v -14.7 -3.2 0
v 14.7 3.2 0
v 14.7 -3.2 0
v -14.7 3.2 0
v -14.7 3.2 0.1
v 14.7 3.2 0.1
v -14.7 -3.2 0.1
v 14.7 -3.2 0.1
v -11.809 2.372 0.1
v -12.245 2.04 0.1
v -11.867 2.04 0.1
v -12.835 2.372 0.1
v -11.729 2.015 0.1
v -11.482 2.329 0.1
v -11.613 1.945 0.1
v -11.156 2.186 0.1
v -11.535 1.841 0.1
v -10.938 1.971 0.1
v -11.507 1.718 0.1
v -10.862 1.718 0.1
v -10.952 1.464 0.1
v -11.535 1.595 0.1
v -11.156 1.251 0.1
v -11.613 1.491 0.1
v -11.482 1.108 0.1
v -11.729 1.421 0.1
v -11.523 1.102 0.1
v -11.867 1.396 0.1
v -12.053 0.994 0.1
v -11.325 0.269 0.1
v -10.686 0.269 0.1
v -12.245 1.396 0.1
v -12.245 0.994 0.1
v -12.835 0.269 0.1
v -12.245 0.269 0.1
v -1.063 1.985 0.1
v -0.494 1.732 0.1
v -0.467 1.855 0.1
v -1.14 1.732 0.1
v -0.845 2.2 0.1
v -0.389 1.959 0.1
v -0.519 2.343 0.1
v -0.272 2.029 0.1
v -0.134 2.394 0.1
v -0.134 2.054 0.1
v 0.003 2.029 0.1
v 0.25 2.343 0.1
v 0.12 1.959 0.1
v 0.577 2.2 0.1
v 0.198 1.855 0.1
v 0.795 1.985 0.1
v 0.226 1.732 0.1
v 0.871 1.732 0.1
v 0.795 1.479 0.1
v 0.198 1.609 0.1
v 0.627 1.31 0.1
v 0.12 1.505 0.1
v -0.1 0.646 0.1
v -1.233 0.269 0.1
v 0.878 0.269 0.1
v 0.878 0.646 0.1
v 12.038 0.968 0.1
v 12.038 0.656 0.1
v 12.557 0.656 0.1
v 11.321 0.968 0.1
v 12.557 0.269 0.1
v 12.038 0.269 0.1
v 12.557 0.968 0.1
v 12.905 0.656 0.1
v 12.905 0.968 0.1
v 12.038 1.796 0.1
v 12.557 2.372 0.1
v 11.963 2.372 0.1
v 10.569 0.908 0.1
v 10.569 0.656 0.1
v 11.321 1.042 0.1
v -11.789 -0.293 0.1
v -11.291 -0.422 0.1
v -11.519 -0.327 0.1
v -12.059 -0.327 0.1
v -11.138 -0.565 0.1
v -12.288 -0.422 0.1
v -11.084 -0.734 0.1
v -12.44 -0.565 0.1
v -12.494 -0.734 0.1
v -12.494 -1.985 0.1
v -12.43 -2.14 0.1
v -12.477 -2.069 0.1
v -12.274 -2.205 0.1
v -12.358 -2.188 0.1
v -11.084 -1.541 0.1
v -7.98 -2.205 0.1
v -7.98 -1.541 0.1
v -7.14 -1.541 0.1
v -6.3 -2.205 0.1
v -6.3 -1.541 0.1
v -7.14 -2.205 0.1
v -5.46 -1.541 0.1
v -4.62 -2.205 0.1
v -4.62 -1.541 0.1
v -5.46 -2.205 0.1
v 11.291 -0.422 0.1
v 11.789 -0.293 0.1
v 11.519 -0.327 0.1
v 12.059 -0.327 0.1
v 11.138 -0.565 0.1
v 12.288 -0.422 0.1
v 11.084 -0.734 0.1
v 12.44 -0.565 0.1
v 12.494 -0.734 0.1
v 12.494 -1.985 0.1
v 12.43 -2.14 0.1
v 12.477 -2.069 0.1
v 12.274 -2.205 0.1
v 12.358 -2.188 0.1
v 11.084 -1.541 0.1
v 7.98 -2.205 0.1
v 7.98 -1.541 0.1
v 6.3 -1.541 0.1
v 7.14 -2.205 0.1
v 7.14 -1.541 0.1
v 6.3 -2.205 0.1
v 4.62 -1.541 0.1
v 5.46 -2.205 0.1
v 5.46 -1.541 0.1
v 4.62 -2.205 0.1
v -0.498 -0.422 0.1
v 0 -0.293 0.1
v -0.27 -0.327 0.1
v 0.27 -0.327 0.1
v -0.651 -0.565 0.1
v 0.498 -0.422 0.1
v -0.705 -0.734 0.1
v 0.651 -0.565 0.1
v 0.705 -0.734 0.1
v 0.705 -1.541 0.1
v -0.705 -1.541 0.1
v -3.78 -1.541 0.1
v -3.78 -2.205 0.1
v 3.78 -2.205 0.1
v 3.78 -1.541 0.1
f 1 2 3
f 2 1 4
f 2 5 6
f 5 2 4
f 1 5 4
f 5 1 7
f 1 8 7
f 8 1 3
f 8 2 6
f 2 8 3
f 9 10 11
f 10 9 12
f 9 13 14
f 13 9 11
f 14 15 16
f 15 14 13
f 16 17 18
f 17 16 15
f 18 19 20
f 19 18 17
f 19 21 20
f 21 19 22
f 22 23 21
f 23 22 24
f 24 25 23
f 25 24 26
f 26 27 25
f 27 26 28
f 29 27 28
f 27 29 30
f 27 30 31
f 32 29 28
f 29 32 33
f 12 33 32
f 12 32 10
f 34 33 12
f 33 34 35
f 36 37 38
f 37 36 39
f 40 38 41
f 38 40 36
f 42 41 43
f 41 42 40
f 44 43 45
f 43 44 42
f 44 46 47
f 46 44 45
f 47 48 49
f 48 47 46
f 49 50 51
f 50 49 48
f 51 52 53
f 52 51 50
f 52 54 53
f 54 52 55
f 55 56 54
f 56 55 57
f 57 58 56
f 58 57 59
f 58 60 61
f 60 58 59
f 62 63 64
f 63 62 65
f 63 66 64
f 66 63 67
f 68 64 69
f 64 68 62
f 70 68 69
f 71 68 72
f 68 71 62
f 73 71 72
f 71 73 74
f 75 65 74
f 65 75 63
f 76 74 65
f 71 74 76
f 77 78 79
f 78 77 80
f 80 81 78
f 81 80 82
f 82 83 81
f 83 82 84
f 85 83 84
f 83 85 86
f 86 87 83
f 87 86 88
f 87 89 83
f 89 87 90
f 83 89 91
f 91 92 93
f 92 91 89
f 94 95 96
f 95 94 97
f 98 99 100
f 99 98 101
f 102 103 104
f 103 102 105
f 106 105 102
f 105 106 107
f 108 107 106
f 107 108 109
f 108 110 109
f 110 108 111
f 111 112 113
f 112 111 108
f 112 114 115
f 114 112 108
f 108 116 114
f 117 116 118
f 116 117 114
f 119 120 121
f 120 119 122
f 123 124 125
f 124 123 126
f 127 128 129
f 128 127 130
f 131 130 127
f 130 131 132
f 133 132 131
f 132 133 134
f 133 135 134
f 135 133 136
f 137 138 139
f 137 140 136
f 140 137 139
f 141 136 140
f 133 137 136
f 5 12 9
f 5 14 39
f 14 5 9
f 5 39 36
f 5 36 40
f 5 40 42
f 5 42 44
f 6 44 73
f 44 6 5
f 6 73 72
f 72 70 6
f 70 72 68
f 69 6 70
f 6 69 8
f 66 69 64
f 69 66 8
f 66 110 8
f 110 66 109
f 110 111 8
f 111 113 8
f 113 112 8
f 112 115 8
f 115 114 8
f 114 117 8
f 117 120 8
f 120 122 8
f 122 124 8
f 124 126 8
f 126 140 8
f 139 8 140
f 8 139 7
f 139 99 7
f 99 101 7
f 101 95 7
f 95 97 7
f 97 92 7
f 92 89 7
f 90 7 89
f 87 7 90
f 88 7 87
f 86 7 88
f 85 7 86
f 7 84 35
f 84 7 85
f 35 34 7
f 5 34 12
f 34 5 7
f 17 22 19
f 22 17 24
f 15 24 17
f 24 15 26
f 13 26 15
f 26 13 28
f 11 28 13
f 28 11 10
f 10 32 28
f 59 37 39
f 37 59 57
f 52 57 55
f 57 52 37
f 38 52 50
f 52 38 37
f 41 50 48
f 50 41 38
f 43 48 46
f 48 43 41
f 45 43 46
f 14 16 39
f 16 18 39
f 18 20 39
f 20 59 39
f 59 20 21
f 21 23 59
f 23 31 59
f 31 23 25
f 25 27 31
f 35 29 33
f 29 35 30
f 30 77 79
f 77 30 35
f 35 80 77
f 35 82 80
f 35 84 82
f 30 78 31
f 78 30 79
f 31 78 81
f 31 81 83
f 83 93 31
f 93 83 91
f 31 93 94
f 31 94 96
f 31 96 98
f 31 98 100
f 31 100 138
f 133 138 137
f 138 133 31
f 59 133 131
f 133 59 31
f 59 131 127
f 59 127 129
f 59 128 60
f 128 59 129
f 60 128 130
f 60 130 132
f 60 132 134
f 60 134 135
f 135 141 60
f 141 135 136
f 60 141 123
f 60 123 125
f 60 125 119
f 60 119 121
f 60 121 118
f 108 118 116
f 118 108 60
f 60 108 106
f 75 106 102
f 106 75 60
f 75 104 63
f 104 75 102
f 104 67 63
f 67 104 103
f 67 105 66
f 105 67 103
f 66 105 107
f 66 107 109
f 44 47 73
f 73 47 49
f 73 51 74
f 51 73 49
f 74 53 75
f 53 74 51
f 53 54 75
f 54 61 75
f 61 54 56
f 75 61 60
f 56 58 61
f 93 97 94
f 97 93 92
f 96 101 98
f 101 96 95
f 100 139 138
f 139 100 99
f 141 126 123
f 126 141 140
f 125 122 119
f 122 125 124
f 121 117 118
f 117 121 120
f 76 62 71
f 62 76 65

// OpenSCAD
// file: ../p/box5-12.scad
use <../lib.scad>
function ldraw_lib__box5_12() = [
// 0 Box with 5 Faces without Any Edges
// 0 Name: box5-12.dat
// 0 Author: Chris Dee [cwdee]
// 0 !LDRAW_ORG Primitive UPDATE 2009-02
// 0 !LICENSE Licensed under CC BY 4.0 : see CAreadme.txt
// 
// 0 BFC CERTIFY CCW
  [0,"BFC","CERTIFY"],
  [0,"BFC","CCW"],
// 
// 0 !HISTORY 2009-09-03 [PTadmin] Official Update 2009-02
// 
// 
// 4 16 1 1 1 1 1 -1 -1 1 -1 -1 1 1
  [4,16,1,1,1,1,1,-1,-1,1,-1,-1,1,1],
// 4 16 -1 0 1 1 0 1 1 1 1 -1 1 1
  [4,16,-1,0,1,1,0,1,1,1,1,-1,1,1],
// 4 16 -1 0 -1 -1 0 1 -1 1 1 -1 1 -1
  [4,16,-1,0,-1,-1,0,1,-1,1,1,-1,1,-1],
// 4 16 1 0 -1 -1 0 -1 -1 1 -1 1 1 -1
  [4,16,1,0,-1,-1,0,-1,-1,1,-1,1,1,-1],
// 4 16 1 0 1 1 0 -1 1 1 -1 1 1 1
  [4,16,1,0,1,1,0,-1,1,1,-1,1,1,1],
// 0
];
module ldraw_lib__box5_12(step=0, col=false, unit=2/5, alt=false, line=0.2, solid=!$preview)
    makepoly(ldraw_lib__box5_12(), step=step, col=col, unit=unit, alt=alt, line=line, solid=solid);
ldraw_lib__box5_12(line=0.2);
// main file
use <../lib.scad>
use <../p/box5-12.scad>
function ldraw_lib__4125165j() = [
// 0 Sticker  0.8 x  3.7 with "R 2 4" and Black Stripes White Background
// 0 Name: 4125165j.dat
// 0 Author: Max Martin Richter [MMR1988]
// 0 !LDRAW_ORG Part UPDATE 2019-03
// 0 !LICENSE Licensed under CC BY 4.0 : see CAreadme.txt
// 
// 0 BFC CERTIFY CCW
  [0,"BFC","CERTIFY"],
  [0,"BFC","CCW"],
// 
// 0 !KEYWORDS Gearbox, Set 8448, Shift
// 
// 0 !HISTORY 2019-12-27 [PTadmin] Official Update 2019-03
// 
// 
// 1 16 0 -.25 0 36.75 0 0 0 .25 0 0 0 8 box5-12.dat
  [1,16,0,-.25,0,36.75,0,0,0,.25,0,0,0,8, ldraw_lib__box5_12()],
// 
// 4 4 -29.5227 -0.25 5.93 -32.088 -0.25 5.93 -30.613 -0.25 5.099 -29.668 -0.25 5.099
  [4,4,-29.5227,-0.25,5.93,-32.088,-0.25,5.93,-30.613,-0.25,5.099,-29.668,-0.25,5.099],
// 4 4 -28.7059 -0.25 5.8232 -29.5227 -0.25 5.93 -29.668 -0.25 5.099 -29.3236 -0.25 5.0378
  [4,4,-28.7059,-0.25,5.8232,-29.5227,-0.25,5.93,-29.668,-0.25,5.099,-29.3236,-0.25,5.0378],
// 4 4 -27.8903 -0.25 5.4648 -28.7059 -0.25 5.8232 -29.3236 -0.25 5.0378 -29.0316 -0.25 4.8635
  [4,4,-27.8903,-0.25,5.4648,-28.7059,-0.25,5.8232,-29.3236,-0.25,5.0378,-29.0316,-0.25,4.8635],
// 4 4 -27.3454 -0.25 4.9286 -27.8903 -0.25 5.4648 -29.0316 -0.25 4.8635 -28.8365 -0.25 4.6027
  [4,4,-27.3454,-0.25,4.9286,-27.8903,-0.25,5.4648,-29.0316,-0.25,4.8635,-28.8365,-0.25,4.6027],
// 4 4 -27.154 -0.25 4.296 -27.3454 -0.25 4.9286 -28.8365 -0.25 4.6027 -28.768 -0.25 4.295
  [4,4,-27.154,-0.25,4.296,-27.3454,-0.25,4.9286,-28.8365,-0.25,4.6027,-28.768,-0.25,4.295],
// 4 4 -27.381 -0.25 3.661 -27.154 -0.25 4.296 -28.768 -0.25 4.295 -28.8365 -0.25 3.9873
  [4,4,-27.381,-0.25,3.661,-27.154,-0.25,4.296,-28.768,-0.25,4.295,-28.8365,-0.25,3.9873],
// 4 4 -27.8903 -0.25 3.1272 -27.381 -0.25 3.661 -28.8365 -0.25 3.9873 -29.0316 -0.25 3.7265
  [4,4,-27.8903,-0.25,3.1272,-27.381,-0.25,3.661,-28.8365,-0.25,3.9873,-29.0316,-0.25,3.7265],
// 4 4 -28.7059 -0.25 2.7688 -27.8903 -0.25 3.1272 -29.0316 -0.25 3.7265 -29.3236 -0.25 3.5522
  [4,4,-28.7059,-0.25,2.7688,-27.8903,-0.25,3.1272,-29.0316,-0.25,3.7265,-29.3236,-0.25,3.5522],
// 4 4 -28.8073 -0.25 2.7556 -28.7059 -0.25 2.7688 -29.3236 -0.25 3.5522 -29.668 -0.25 3.491
  [4,4,-28.8073,-0.25,2.7556,-28.7059,-0.25,2.7688,-29.3236,-0.25,3.5522,-29.668,-0.25,3.491],
// 4 4 -28.8073 -0.25 2.7556 -29.668 -0.25 3.491 -30.132 -0.25 2.485 -28.3114 -0.25 0.672
  [4,4,-28.8073,-0.25,2.7556,-29.668,-0.25,3.491,-30.132,-0.25,2.485,-28.3114,-0.25,0.672],
// 3 4 -28.8073 -0.25 2.7556 -28.3114 -0.25 0.672 -26.7149 -0.25 0.672
  [3,4,-28.8073,-0.25,2.7556,-28.3114,-0.25,0.672,-26.7149,-0.25,0.672],
// 4 4 -30.132 -0.25 2.485 -29.668 -0.25 3.491 -30.613 -0.25 3.491 -30.613 -0.25 2.485
  [4,4,-30.132,-0.25,2.485,-29.668,-0.25,3.491,-30.613,-0.25,3.491,-30.613,-0.25,2.485],
// 3 4 -32.088 -0.25 5.93 -30.613 -0.25 2.485 -30.613 -0.25 3.491
  [3,4,-32.088,-0.25,5.93,-30.613,-0.25,2.485,-30.613,-0.25,3.491],
// 3 4 -32.088 -0.25 5.93 -30.613 -0.25 3.491 -30.613 -0.25 5.099
  [3,4,-32.088,-0.25,5.93,-30.613,-0.25,3.491,-30.613,-0.25,5.099],
// 4 4 -32.088 -0.25 5.93 -32.088 -0.25 0.672 -30.613 -0.25 0.672 -30.613 -0.25 2.485
  [4,4,-32.088,-0.25,5.93,-32.088,-0.25,0.672,-30.613,-0.25,0.672,-30.613,-0.25,2.485],
// 4 4 -2.85 -0.25 4.331 -1.2358 -0.25 4.331 -1.1675 -0.25 4.6377 -2.6586 -0.25 4.9636
  [4,4,-2.85,-0.25,4.331,-1.2358,-0.25,4.331,-1.1675,-0.25,4.6377,-2.6586,-0.25,4.9636],
// 4 4 -2.1137 -0.25 5.4998 -2.6586 -0.25 4.9636 -1.1675 -0.25 4.6377 -0.9724 -0.25 4.8985
  [4,4,-2.1137,-0.25,5.4998,-2.6586,-0.25,4.9636,-1.1675,-0.25,4.6377,-0.9724,-0.25,4.8985],
// 4 4 -1.2981 -0.25 5.8582 -2.1137 -0.25 5.4998 -0.9724 -0.25 4.8985 -0.6804 -0.25 5.0728
  [4,4,-1.2981,-0.25,5.8582,-2.1137,-0.25,5.4998,-0.9724,-0.25,4.8985,-0.6804,-0.25,5.0728],
// 4 4 -0.336 -0.25 5.984 -1.2981 -0.25 5.8582 -0.6804 -0.25 5.0728 -0.336 -0.25 5.134
  [4,4,-0.336,-0.25,5.984,-1.2981,-0.25,5.8582,-0.6804,-0.25,5.0728,-0.336,-0.25,5.134],
// 4 4 0.6261 -0.25 5.8582 -0.336 -0.25 5.984 -0.336 -0.25 5.134 0.0084 -0.25 5.0728
  [4,4,0.6261,-0.25,5.8582,-0.336,-0.25,5.984,-0.336,-0.25,5.134,0.0084,-0.25,5.0728],
// 4 4 1.4417 -0.25 5.4998 0.6261 -0.25 5.8582 0.0084 -0.25 5.0728 0.3004 -0.25 4.8985
  [4,4,1.4417,-0.25,5.4998,0.6261,-0.25,5.8582,0.0084,-0.25,5.0728,0.3004,-0.25,4.8985],
// 4 4 1.9866 -0.25 4.9636 1.4417 -0.25 5.4998 0.3004 -0.25 4.8985 0.4955 -0.25 4.6377
  [4,4,1.9866,-0.25,4.9636,1.4417,-0.25,5.4998,0.3004,-0.25,4.8985,0.4955,-0.25,4.6377],
// 4 4 2.178 -0.25 4.331 1.9866 -0.25 4.9636 0.4955 -0.25 4.6377 0.5638 -0.25 4.331
  [4,4,2.178,-0.25,4.331,1.9866,-0.25,4.9636,0.4955,-0.25,4.6377,0.5638,-0.25,4.331],
// 4 4 1.9866 -0.25 3.6984 2.178 -0.25 4.331 0.5638 -0.25 4.331 0.4955 -0.25 4.0223
  [4,4,1.9866,-0.25,3.6984,2.178,-0.25,4.331,0.5638,-0.25,4.331,0.4955,-0.25,4.0223],
// 4 4 1.5671 -0.25 3.2746 1.9866 -0.25 3.6984 0.4955 -0.25 4.0223 0.3 -0.25 3.7618
  [4,4,1.5671,-0.25,3.2746,1.9866,-0.25,3.6984,0.4955,-0.25,4.0223,0.3,-0.25,3.7618],
// 4 4 -0.249 -0.25 1.616 1.5671 -0.25 3.2746 0.3 -0.25 3.7618 -3.0834 -0.25 0.672
  [4,4,-0.249,-0.25,1.616,1.5671,-0.25,3.2746,0.3,-0.25,3.7618,-3.0834,-0.25,0.672],
// 4 4 -0.249 -0.25 1.616 -3.0834 -0.25 0.672 2.194 -0.25 0.672 2.194 -0.25 1.616
  [4,4,-0.249,-0.25,1.616,-3.0834,-0.25,0.672,2.194,-0.25,0.672,2.194,-0.25,1.616],
// 4 4 30.096 -0.25 1.641 31.3937 -0.25 1.641 30.096 -0.25 2.419 28.3027 -0.25 2.419
  [4,4,30.096,-0.25,1.641,31.3937,-0.25,1.641,30.096,-0.25,2.419,28.3027,-0.25,2.419],
// 4 4 30.096 -0.25 0.672 31.3937 -0.25 0.672 31.3937 -0.25 1.641 30.096 -0.25 1.641
  [4,4,30.096,-0.25,0.672,31.3937,-0.25,0.672,31.3937,-0.25,1.641,30.096,-0.25,1.641],
// 4 4 30.096 -0.25 2.419 31.3937 -0.25 1.641 32.2627 -0.25 1.641 31.3937 -0.25 2.419
  [4,4,30.096,-0.25,2.419,31.3937,-0.25,1.641,32.2627,-0.25,1.641,31.3937,-0.25,2.419],
// 3 4 32.2627 -0.25 2.419 31.3937 -0.25 2.419 32.2627 -0.25 1.641
  [3,4,32.2627,-0.25,2.419,31.3937,-0.25,2.419,32.2627,-0.25,1.641],
// 4 4 30.096 -0.25 2.419 31.3937 -0.25 2.419 31.3937 -0.25 5.93 30.096 -0.25 4.4889
  [4,4,30.096,-0.25,2.419,31.3937,-0.25,2.419,31.3937,-0.25,5.93,30.096,-0.25,4.4889],
// 4 4 30.096 -0.25 4.4889 31.3937 -0.25 5.93 29.9079 -0.25 5.93 26.4237 -0.25 2.2707
  [4,4,30.096,-0.25,4.4889,31.3937,-0.25,5.93,29.9079,-0.25,5.93,26.4237,-0.25,2.2707],
// 4 4 26.4237 -0.25 1.641 30.096 -0.25 1.641 28.3027 -0.25 2.419 26.4237 -0.25 2.2707
  [4,4,26.4237,-0.25,1.641,30.096,-0.25,1.641,28.3027,-0.25,2.419,26.4237,-0.25,2.2707],
// 3 4 28.3027 -0.25 2.6055 26.4237 -0.25 2.2707 28.3027 -0.25 2.419
  [3,4,28.3027,-0.25,2.6055,26.4237,-0.25,2.2707,28.3027,-0.25,2.419],
// 3 4 30.096 -0.25 4.4889 26.4237 -0.25 2.2707 28.3027 -0.25 2.6055
  [3,4,30.096,-0.25,4.4889,26.4237,-0.25,2.2707,28.3027,-0.25,2.6055],
// 4 0 -28.7987 -0.25 -0.8168 -29.473 -0.25 -0.733 -30.1473 -0.25 -0.8168 -28.2271 -0.25 -1.0555
  [4,0,-28.7987,-0.25,-0.8168,-29.473,-0.25,-0.733,-30.1473,-0.25,-0.8168,-28.2271,-0.25,-1.0555],
// 4 0 -28.2271 -0.25 -1.0555 -30.1473 -0.25 -0.8168 -30.7189 -0.25 -1.0555 -27.8451 -0.25 -1.4127
  [4,0,-28.2271,-0.25,-1.0555,-30.1473,-0.25,-0.8168,-30.7189,-0.25,-1.0555,-27.8451,-0.25,-1.4127],
// 4 0 -27.8451 -0.25 -1.4127 -30.7189 -0.25 -1.0555 -31.1009 -0.25 -1.4127 -27.711 -0.25 -1.834
  [4,0,-27.8451,-0.25,-1.4127,-30.7189,-0.25,-1.0555,-31.1009,-0.25,-1.4127,-27.711,-0.25,-1.834],
// 4 0 -27.711 -0.25 -1.834 -31.1009 -0.25 -1.4127 -31.235 -0.25 -1.834 -31.235 -0.25 -4.963
  [4,0,-27.711,-0.25,-1.834,-31.1009,-0.25,-1.4127,-31.235,-0.25,-1.834,-31.235,-0.25,-4.963],
// 4 0 -27.711 -0.25 -1.834 -31.235 -0.25 -4.963 -31.1932 -0.25 -5.1731 -31.0742 -0.25 -5.3512
  [4,0,-27.711,-0.25,-1.834,-31.235,-0.25,-4.963,-31.1932,-0.25,-5.1731,-31.0742,-0.25,-5.3512],
// 4 0 -27.711 -0.25 -1.834 -31.0742 -0.25 -5.3512 -30.8961 -0.25 -5.4702 -30.686 -0.25 -5.512
  [4,0,-27.711,-0.25,-1.834,-31.0742,-0.25,-5.3512,-30.8961,-0.25,-5.4702,-30.686,-0.25,-5.512],
// 3 0 -27.711 -0.25 -1.834 -30.686 -0.25 -5.512 -27.711 -0.25 -3.853
  [3,0,-27.711,-0.25,-1.834,-30.686,-0.25,-5.512,-27.711,-0.25,-3.853],
// 4 0 -19.95 -0.25 -3.853 -27.711 -0.25 -3.853 -30.686 -0.25 -5.512 -19.95 -0.25 -5.512
  [4,0,-19.95,-0.25,-3.853,-27.711,-0.25,-3.853,-30.686,-0.25,-5.512,-19.95,-0.25,-5.512],
// 4 0 -15.75 -0.25 -5.512 -15.75 -0.25 -3.853 -17.85 -0.25 -3.853 -17.85 -0.25 -5.512
  [4,0,-15.75,-0.25,-5.512,-15.75,-0.25,-3.853,-17.85,-0.25,-3.853,-17.85,-0.25,-5.512],
// 4 0 -11.55 -0.25 -5.512 -11.55 -0.25 -3.853 -13.65 -0.25 -3.853 -13.65 -0.25 -5.512
  [4,0,-11.55,-0.25,-5.512,-11.55,-0.25,-3.853,-13.65,-0.25,-3.853,-13.65,-0.25,-5.512],
// 4 0 30.1473 -0.25 -0.8168 29.473 -0.25 -0.733 28.7987 -0.25 -0.8168 28.2271 -0.25 -1.0555
  [4,0,30.1473,-0.25,-0.8168,29.473,-0.25,-0.733,28.7987,-0.25,-0.8168,28.2271,-0.25,-1.0555],
// 4 0 30.7189 -0.25 -1.0555 30.1473 -0.25 -0.8168 28.2271 -0.25 -1.0555 27.8451 -0.25 -1.4127
  [4,0,30.7189,-0.25,-1.0555,30.1473,-0.25,-0.8168,28.2271,-0.25,-1.0555,27.8451,-0.25,-1.4127],
// 4 0 31.1009 -0.25 -1.4127 30.7189 -0.25 -1.0555 27.8451 -0.25 -1.4127 27.711 -0.25 -1.834
  [4,0,31.1009,-0.25,-1.4127,30.7189,-0.25,-1.0555,27.8451,-0.25,-1.4127,27.711,-0.25,-1.834],
// 4 0 31.235 -0.25 -1.834 31.1009 -0.25 -1.4127 27.711 -0.25 -1.834 31.235 -0.25 -4.963
  [4,0,31.235,-0.25,-1.834,31.1009,-0.25,-1.4127,27.711,-0.25,-1.834,31.235,-0.25,-4.963],
// 4 0 31.1932 -0.25 -5.1731 31.235 -0.25 -4.963 27.711 -0.25 -1.834 31.0742 -0.25 -5.3512
  [4,0,31.1932,-0.25,-5.1731,31.235,-0.25,-4.963,27.711,-0.25,-1.834,31.0742,-0.25,-5.3512],
// 4 0 30.8961 -0.25 -5.4702 31.0742 -0.25 -5.3512 27.711 -0.25 -1.834 30.686 -0.25 -5.512
  [4,0,30.8961,-0.25,-5.4702,31.0742,-0.25,-5.3512,27.711,-0.25,-1.834,30.686,-0.25,-5.512],
// 3 0 27.711 -0.25 -1.834 27.711 -0.25 -3.853 30.686 -0.25 -5.512
  [3,0,27.711,-0.25,-1.834,27.711,-0.25,-3.853,30.686,-0.25,-5.512],
// 4 0 30.686 -0.25 -5.512 27.711 -0.25 -3.853 19.95 -0.25 -3.853 19.95 -0.25 -5.512
  [4,0,30.686,-0.25,-5.512,27.711,-0.25,-3.853,19.95,-0.25,-3.853,19.95,-0.25,-5.512],
// 4 0 17.85 -0.25 -3.853 15.75 -0.25 -3.853 15.75 -0.25 -5.512 17.85 -0.25 -5.512
  [4,0,17.85,-0.25,-3.853,15.75,-0.25,-3.853,15.75,-0.25,-5.512,17.85,-0.25,-5.512],
// 4 0 13.65 -0.25 -3.853 11.55 -0.25 -3.853 11.55 -0.25 -5.512 13.65 -0.25 -5.512
  [4,0,13.65,-0.25,-3.853,11.55,-0.25,-3.853,11.55,-0.25,-5.512,13.65,-0.25,-5.512],
// 4 0 0.6743 -0.25 -0.8168 0 -0.25 -0.733 -0.6743 -0.25 -0.8168 -1.2459 -0.25 -1.0555
  [4,0,0.6743,-0.25,-0.8168,0,-0.25,-0.733,-0.6743,-0.25,-0.8168,-1.2459,-0.25,-1.0555],
// 4 0 1.2459 -0.25 -1.0555 0.6743 -0.25 -0.8168 -1.2459 -0.25 -1.0555 -1.6279 -0.25 -1.4127
  [4,0,1.2459,-0.25,-1.0555,0.6743,-0.25,-0.8168,-1.2459,-0.25,-1.0555,-1.6279,-0.25,-1.4127],
// 4 0 1.6279 -0.25 -1.4127 1.2459 -0.25 -1.0555 -1.6279 -0.25 -1.4127 -1.762 -0.25 -1.834
  [4,0,1.6279,-0.25,-1.4127,1.2459,-0.25,-1.0555,-1.6279,-0.25,-1.4127,-1.762,-0.25,-1.834],
// 4 0 1.762 -0.25 -1.834 1.6279 -0.25 -1.4127 -1.762 -0.25 -1.834 1.762 -0.25 -3.853
  [4,0,1.762,-0.25,-1.834,1.6279,-0.25,-1.4127,-1.762,-0.25,-1.834,1.762,-0.25,-3.853],
// 3 0 -1.762 -0.25 -3.853 -9.45 -0.25 -3.853 -9.45 -0.25 -5.512
  [3,0,-1.762,-0.25,-3.853,-9.45,-0.25,-3.853,-9.45,-0.25,-5.512],
// 4 0 1.762 -0.25 -3.853 -1.762 -0.25 -3.853 -9.45 -0.25 -5.512 9.45 -0.25 -5.512
  [4,0,1.762,-0.25,-3.853,-1.762,-0.25,-3.853,-9.45,-0.25,-5.512,9.45,-0.25,-5.512],
// 3 0 9.45 -0.25 -3.853 1.762 -0.25 -3.853 9.45 -0.25 -5.512
  [3,0,9.45,-0.25,-3.853,1.762,-0.25,-3.853,9.45,-0.25,-5.512],
// 3 0 -1.762 -0.25 -1.834 -1.762 -0.25 -3.853 1.762 -0.25 -3.853
  [3,0,-1.762,-0.25,-1.834,-1.762,-0.25,-3.853,1.762,-0.25,-3.853],
// 3 15 -36.75 -0.25 8 -32.088 -0.25 5.93 -29.5227 -0.25 5.93
  [3,15,-36.75,-0.25,8,-32.088,-0.25,5.93,-29.5227,-0.25,5.93],
// 4 15 -36.75 -0.25 8 -29.5227 -0.25 5.93 -28.7059 -0.25 5.8232 -2.85 -0.25 4.331
  [4,15,-36.75,-0.25,8,-29.5227,-0.25,5.93,-28.7059,-0.25,5.8232,-2.85,-0.25,4.331],
// 3 15 -36.75 -0.25 8 -2.85 -0.25 4.331 -2.6586 -0.25 4.9636
  [3,15,-36.75,-0.25,8,-2.85,-0.25,4.331,-2.6586,-0.25,4.9636],
// 3 15 -36.75 -0.25 8 -2.6586 -0.25 4.9636 -2.1137 -0.25 5.4998
  [3,15,-36.75,-0.25,8,-2.6586,-0.25,4.9636,-2.1137,-0.25,5.4998],
// 3 15 -36.75 -0.25 8 -2.1137 -0.25 5.4998 -1.2981 -0.25 5.8582
  [3,15,-36.75,-0.25,8,-2.1137,-0.25,5.4998,-1.2981,-0.25,5.8582],
// 3 15 -36.75 -0.25 8 -1.2981 -0.25 5.8582 -0.336 -0.25 5.984
  [3,15,-36.75,-0.25,8,-1.2981,-0.25,5.8582,-0.336,-0.25,5.984],
// 4 15 -36.75 -0.25 8 -0.336 -0.25 5.984 29.9079 -0.25 5.93 36.75 -0.25 8
  [4,15,-36.75,-0.25,8,-0.336,-0.25,5.984,29.9079,-0.25,5.93,36.75,-0.25,8],
// 3 15 36.75 -0.25 8 29.9079 -0.25 5.93 31.3937 -0.25 5.93
  [3,15,36.75,-0.25,8,29.9079,-0.25,5.93,31.3937,-0.25,5.93],
// 4 15 36.75 -0.25 8 31.3937 -0.25 5.93 31.3937 -0.25 2.419 32.2627 -0.25 2.419
  [4,15,36.75,-0.25,8,31.3937,-0.25,5.93,31.3937,-0.25,2.419,32.2627,-0.25,2.419],
// 4 15 36.75 -0.25 8 32.2627 -0.25 2.419 32.2627 -0.25 1.641 36.75 -0.25 -8
  [4,15,36.75,-0.25,8,32.2627,-0.25,2.419,32.2627,-0.25,1.641,36.75,-0.25,-8],
// 4 15 36.75 -0.25 -8 32.2627 -0.25 1.641 31.3937 -0.25 1.641 31.3937 -0.25 0.672
  [4,15,36.75,-0.25,-8,32.2627,-0.25,1.641,31.3937,-0.25,1.641,31.3937,-0.25,0.672],
// 4 15 36.75 -0.25 -8 31.3937 -0.25 0.672 31.1009 -0.25 -1.4127 31.235 -0.25 -1.834
  [4,15,36.75,-0.25,-8,31.3937,-0.25,0.672,31.1009,-0.25,-1.4127,31.235,-0.25,-1.834],
// 3 15 31.235 -0.25 -1.834 31.235 -0.25 -4.963 36.75 -0.25 -8
  [3,15,31.235,-0.25,-1.834,31.235,-0.25,-4.963,36.75,-0.25,-8],
// 3 15 31.235 -0.25 -4.963 31.1932 -0.25 -5.1731 36.75 -0.25 -8
  [3,15,31.235,-0.25,-4.963,31.1932,-0.25,-5.1731,36.75,-0.25,-8],
// 3 15 31.1932 -0.25 -5.1731 31.0742 -0.25 -5.3512 36.75 -0.25 -8
  [3,15,31.1932,-0.25,-5.1731,31.0742,-0.25,-5.3512,36.75,-0.25,-8],
// 3 15 31.0742 -0.25 -5.3512 30.8961 -0.25 -5.4702 36.75 -0.25 -8
  [3,15,31.0742,-0.25,-5.3512,30.8961,-0.25,-5.4702,36.75,-0.25,-8],
// 3 15 30.8961 -0.25 -5.4702 30.686 -0.25 -5.512 36.75 -0.25 -8
  [3,15,30.8961,-0.25,-5.4702,30.686,-0.25,-5.512,36.75,-0.25,-8],
// 3 15 30.686 -0.25 -5.512 19.95 -0.25 -5.512 36.75 -0.25 -8
  [3,15,30.686,-0.25,-5.512,19.95,-0.25,-5.512,36.75,-0.25,-8],
// 3 15 19.95 -0.25 -5.512 17.85 -0.25 -5.512 36.75 -0.25 -8
  [3,15,19.95,-0.25,-5.512,17.85,-0.25,-5.512,36.75,-0.25,-8],
// 3 15 17.85 -0.25 -5.512 15.75 -0.25 -5.512 36.75 -0.25 -8
  [3,15,17.85,-0.25,-5.512,15.75,-0.25,-5.512,36.75,-0.25,-8],
// 3 15 15.75 -0.25 -5.512 13.65 -0.25 -5.512 36.75 -0.25 -8
  [3,15,15.75,-0.25,-5.512,13.65,-0.25,-5.512,36.75,-0.25,-8],
// 3 15 13.65 -0.25 -5.512 11.55 -0.25 -5.512 36.75 -0.25 -8
  [3,15,13.65,-0.25,-5.512,11.55,-0.25,-5.512,36.75,-0.25,-8],
// 3 15 11.55 -0.25 -5.512 9.45 -0.25 -5.512 36.75 -0.25 -8
  [3,15,11.55,-0.25,-5.512,9.45,-0.25,-5.512,36.75,-0.25,-8],
// 4 15 36.75 -0.25 -8 9.45 -0.25 -5.512 -9.45 -0.25 -5.512 -36.75 -0.25 -8
  [4,15,36.75,-0.25,-8,9.45,-0.25,-5.512,-9.45,-0.25,-5.512,-36.75,-0.25,-8],
// 3 15 -9.45 -0.25 -5.512 -11.55 -0.25 -5.512 -36.75 -0.25 -8
  [3,15,-9.45,-0.25,-5.512,-11.55,-0.25,-5.512,-36.75,-0.25,-8],
// 3 15 -11.55 -0.25 -5.512 -13.65 -0.25 -5.512 -36.75 -0.25 -8
  [3,15,-11.55,-0.25,-5.512,-13.65,-0.25,-5.512,-36.75,-0.25,-8],
// 3 15 -13.65 -0.25 -5.512 -15.75 -0.25 -5.512 -36.75 -0.25 -8
  [3,15,-13.65,-0.25,-5.512,-15.75,-0.25,-5.512,-36.75,-0.25,-8],
// 3 15 -15.75 -0.25 -5.512 -17.85 -0.25 -5.512 -36.75 -0.25 -8
  [3,15,-15.75,-0.25,-5.512,-17.85,-0.25,-5.512,-36.75,-0.25,-8],
// 3 15 -17.85 -0.25 -5.512 -19.95 -0.25 -5.512 -36.75 -0.25 -8
  [3,15,-17.85,-0.25,-5.512,-19.95,-0.25,-5.512,-36.75,-0.25,-8],
// 3 15 -19.95 -0.25 -5.512 -30.686 -0.25 -5.512 -36.75 -0.25 -8
  [3,15,-19.95,-0.25,-5.512,-30.686,-0.25,-5.512,-36.75,-0.25,-8],
// 3 15 -30.8961 -0.25 -5.4702 -36.75 -0.25 -8 -30.686 -0.25 -5.512
  [3,15,-30.8961,-0.25,-5.4702,-36.75,-0.25,-8,-30.686,-0.25,-5.512],
// 3 15 -31.0742 -0.25 -5.3512 -36.75 -0.25 -8 -30.8961 -0.25 -5.4702
  [3,15,-31.0742,-0.25,-5.3512,-36.75,-0.25,-8,-30.8961,-0.25,-5.4702],
// 3 15 -31.1932 -0.25 -5.1731 -36.75 -0.25 -8 -31.0742 -0.25 -5.3512
  [3,15,-31.1932,-0.25,-5.1731,-36.75,-0.25,-8,-31.0742,-0.25,-5.3512],
// 3 15 -31.235 -0.25 -4.963 -36.75 -0.25 -8 -31.1932 -0.25 -5.1731
  [3,15,-31.235,-0.25,-4.963,-36.75,-0.25,-8,-31.1932,-0.25,-5.1731],
// 3 15 -31.235 -0.25 -1.834 -36.75 -0.25 -8 -31.235 -0.25 -4.963
  [3,15,-31.235,-0.25,-1.834,-36.75,-0.25,-8,-31.235,-0.25,-4.963],
// 4 15 -36.75 -0.25 -8 -31.235 -0.25 -1.834 -31.1009 -0.25 -1.4127 -30.613 -0.25 0.672
  [4,15,-36.75,-0.25,-8,-31.235,-0.25,-1.834,-31.1009,-0.25,-1.4127,-30.613,-0.25,0.672],
// 3 15 -30.613 -0.25 0.672 -32.088 -0.25 0.672 -36.75 -0.25 -8
  [3,15,-30.613,-0.25,0.672,-32.088,-0.25,0.672,-36.75,-0.25,-8],
// 4 15 -36.75 -0.25 -8 -32.088 -0.25 0.672 -32.088 -0.25 5.93 -36.75 -0.25 8
  [4,15,-36.75,-0.25,-8,-32.088,-0.25,0.672,-32.088,-0.25,5.93,-36.75,-0.25,8],
// 4 15 -28.8365 -0.25 3.9873 -28.768 -0.25 4.295 -28.8365 -0.25 4.6027 -29.0316 -0.25 3.7265
  [4,15,-28.8365,-0.25,3.9873,-28.768,-0.25,4.295,-28.8365,-0.25,4.6027,-29.0316,-0.25,3.7265],
// 4 15 -29.0316 -0.25 3.7265 -28.8365 -0.25 4.6027 -29.0316 -0.25 4.8635 -29.3236 -0.25 3.5522
  [4,15,-29.0316,-0.25,3.7265,-28.8365,-0.25,4.6027,-29.0316,-0.25,4.8635,-29.3236,-0.25,3.5522],
// 4 15 -29.3236 -0.25 3.5522 -29.0316 -0.25 4.8635 -29.3236 -0.25 5.0378 -29.668 -0.25 3.491
  [4,15,-29.3236,-0.25,3.5522,-29.0316,-0.25,4.8635,-29.3236,-0.25,5.0378,-29.668,-0.25,3.491],
// 4 15 -29.668 -0.25 3.491 -29.3236 -0.25 5.0378 -29.668 -0.25 5.099 -30.613 -0.25 5.099
  [4,15,-29.668,-0.25,3.491,-29.3236,-0.25,5.0378,-29.668,-0.25,5.099,-30.613,-0.25,5.099],
// 3 15 -30.613 -0.25 5.099 -30.613 -0.25 3.491 -29.668 -0.25 3.491
  [3,15,-30.613,-0.25,5.099,-30.613,-0.25,3.491,-29.668,-0.25,3.491],
// 4 15 -1.2358 -0.25 4.331 -2.85 -0.25 4.331 -3.0834 -0.25 0.672 0.3 -0.25 3.7618
  [4,15,-1.2358,-0.25,4.331,-2.85,-0.25,4.331,-3.0834,-0.25,0.672,0.3,-0.25,3.7618],
// 4 15 -1.2358 -0.25 4.331 0.3 -0.25 3.7618 0.4955 -0.25 4.0223 0.5638 -0.25 4.331
  [4,15,-1.2358,-0.25,4.331,0.3,-0.25,3.7618,0.4955,-0.25,4.0223,0.5638,-0.25,4.331],
// 4 15 -1.1675 -0.25 4.6377 -1.2358 -0.25 4.331 0.5638 -0.25 4.331 0.4955 -0.25 4.6377
  [4,15,-1.1675,-0.25,4.6377,-1.2358,-0.25,4.331,0.5638,-0.25,4.331,0.4955,-0.25,4.6377],
// 4 15 -0.9724 -0.25 4.8985 -1.1675 -0.25 4.6377 0.4955 -0.25 4.6377 0.3004 -0.25 4.8985
  [4,15,-0.9724,-0.25,4.8985,-1.1675,-0.25,4.6377,0.4955,-0.25,4.6377,0.3004,-0.25,4.8985],
// 4 15 -0.6804 -0.25 5.0728 -0.9724 -0.25 4.8985 0.3004 -0.25 4.8985 0.0084 -0.25 5.0728
  [4,15,-0.6804,-0.25,5.0728,-0.9724,-0.25,4.8985,0.3004,-0.25,4.8985,0.0084,-0.25,5.0728],
// 3 15 -0.336 -0.25 5.134 -0.6804 -0.25 5.0728 0.0084 -0.25 5.0728
  [3,15,-0.336,-0.25,5.134,-0.6804,-0.25,5.0728,0.0084,-0.25,5.0728],
// 3 15 -28.7059 -0.25 5.8232 -27.8903 -0.25 5.4648 -2.85 -0.25 4.331
  [3,15,-28.7059,-0.25,5.8232,-27.8903,-0.25,5.4648,-2.85,-0.25,4.331],
// 3 15 -27.8903 -0.25 5.4648 -27.3454 -0.25 4.9286 -2.85 -0.25 4.331
  [3,15,-27.8903,-0.25,5.4648,-27.3454,-0.25,4.9286,-2.85,-0.25,4.331],
// 3 15 -27.3454 -0.25 4.9286 -27.154 -0.25 4.296 -2.85 -0.25 4.331
  [3,15,-27.3454,-0.25,4.9286,-27.154,-0.25,4.296,-2.85,-0.25,4.331],
// 4 15 -2.85 -0.25 4.331 -27.154 -0.25 4.296 -27.381 -0.25 3.661 -3.0834 -0.25 0.672
  [4,15,-2.85,-0.25,4.331,-27.154,-0.25,4.296,-27.381,-0.25,3.661,-3.0834,-0.25,0.672],
// 3 15 -27.381 -0.25 3.661 -27.8903 -0.25 3.1272 -3.0834 -0.25 0.672
  [3,15,-27.381,-0.25,3.661,-27.8903,-0.25,3.1272,-3.0834,-0.25,0.672],
// 4 15 -3.0834 -0.25 0.672 -27.8903 -0.25 3.1272 -28.7059 -0.25 2.7688 -26.7149 -0.25 0.672
  [4,15,-3.0834,-0.25,0.672,-27.8903,-0.25,3.1272,-28.7059,-0.25,2.7688,-26.7149,-0.25,0.672],
// 3 15 -28.7059 -0.25 2.7688 -28.8073 -0.25 2.7556 -26.7149 -0.25 0.672
  [3,15,-28.7059,-0.25,2.7688,-28.8073,-0.25,2.7556,-26.7149,-0.25,0.672],
// 4 15 -30.132 -0.25 2.485 -30.613 -0.25 2.485 -30.613 -0.25 0.672 -28.3114 -0.25 0.672
  [4,15,-30.132,-0.25,2.485,-30.613,-0.25,2.485,-30.613,-0.25,0.672,-28.3114,-0.25,0.672],
// 4 15 -28.7987 -0.25 -0.8168 -28.3114 -0.25 0.672 -30.613 -0.25 0.672 -29.473 -0.25 -0.733
  [4,15,-28.7987,-0.25,-0.8168,-28.3114,-0.25,0.672,-30.613,-0.25,0.672,-29.473,-0.25,-0.733],
// 3 15 -30.613 -0.25 0.672 -30.1473 -0.25 -0.8168 -29.473 -0.25 -0.733
  [3,15,-30.613,-0.25,0.672,-30.1473,-0.25,-0.8168,-29.473,-0.25,-0.733],
// 3 15 -30.613 -0.25 0.672 -30.7189 -0.25 -1.0555 -30.1473 -0.25 -0.8168
  [3,15,-30.613,-0.25,0.672,-30.7189,-0.25,-1.0555,-30.1473,-0.25,-0.8168],
// 3 15 -30.613 -0.25 0.672 -31.1009 -0.25 -1.4127 -30.7189 -0.25 -1.0555
  [3,15,-30.613,-0.25,0.672,-31.1009,-0.25,-1.4127,-30.7189,-0.25,-1.0555],
// 4 15 -26.7149 -0.25 0.672 -28.3114 -0.25 0.672 -28.7987 -0.25 -0.8168 -28.2271 -0.25 -1.0555
  [4,15,-26.7149,-0.25,0.672,-28.3114,-0.25,0.672,-28.7987,-0.25,-0.8168,-28.2271,-0.25,-1.0555],
// 3 15 -26.7149 -0.25 0.672 -28.2271 -0.25 -1.0555 -27.8451 -0.25 -1.4127
  [3,15,-26.7149,-0.25,0.672,-28.2271,-0.25,-1.0555,-27.8451,-0.25,-1.4127],
// 3 15 -26.7149 -0.25 0.672 -27.8451 -0.25 -1.4127 -27.711 -0.25 -1.834
  [3,15,-26.7149,-0.25,0.672,-27.8451,-0.25,-1.4127,-27.711,-0.25,-1.834],
// 4 15 -26.7149 -0.25 0.672 -27.711 -0.25 -1.834 -27.711 -0.25 -3.853 -19.95 -0.25 -3.853
  [4,15,-26.7149,-0.25,0.672,-27.711,-0.25,-1.834,-27.711,-0.25,-3.853,-19.95,-0.25,-3.853],
// 3 15 -26.7149 -0.25 0.672 -19.95 -0.25 -3.853 -17.85 -0.25 -3.853
  [3,15,-26.7149,-0.25,0.672,-19.95,-0.25,-3.853,-17.85,-0.25,-3.853],
// 3 15 -26.7149 -0.25 0.672 -17.85 -0.25 -3.853 -15.75 -0.25 -3.853
  [3,15,-26.7149,-0.25,0.672,-17.85,-0.25,-3.853,-15.75,-0.25,-3.853],
// 3 15 -26.7149 -0.25 0.672 -15.75 -0.25 -3.853 -13.65 -0.25 -3.853
  [3,15,-26.7149,-0.25,0.672,-15.75,-0.25,-3.853,-13.65,-0.25,-3.853],
// 3 15 -26.7149 -0.25 0.672 -13.65 -0.25 -3.853 -11.55 -0.25 -3.853
  [3,15,-26.7149,-0.25,0.672,-13.65,-0.25,-3.853,-11.55,-0.25,-3.853],
// 3 15 -26.7149 -0.25 0.672 -11.55 -0.25 -3.853 -9.45 -0.25 -3.853
  [3,15,-26.7149,-0.25,0.672,-11.55,-0.25,-3.853,-9.45,-0.25,-3.853],
// 4 15 -26.7149 -0.25 0.672 -9.45 -0.25 -3.853 -1.762 -0.25 -3.853 -1.762 -0.25 -1.834
  [4,15,-26.7149,-0.25,0.672,-9.45,-0.25,-3.853,-1.762,-0.25,-3.853,-1.762,-0.25,-1.834],
// 4 15 -3.0834 -0.25 0.672 -26.7149 -0.25 0.672 -1.762 -0.25 -1.834 -1.6279 -0.25 -1.4127
  [4,15,-3.0834,-0.25,0.672,-26.7149,-0.25,0.672,-1.762,-0.25,-1.834,-1.6279,-0.25,-1.4127],
// 3 15 -3.0834 -0.25 0.672 -1.6279 -0.25 -1.4127 -1.2459 -0.25 -1.0555
  [3,15,-3.0834,-0.25,0.672,-1.6279,-0.25,-1.4127,-1.2459,-0.25,-1.0555],
// 3 15 -3.0834 -0.25 0.672 -1.2459 -0.25 -1.0555 -0.6743 -0.25 -0.8168
  [3,15,-3.0834,-0.25,0.672,-1.2459,-0.25,-1.0555,-0.6743,-0.25,-0.8168],
// 4 15 -3.0834 -0.25 0.672 -0.6743 -0.25 -0.8168 0 -0.25 -0.733 2.194 -0.25 0.672
  [4,15,-3.0834,-0.25,0.672,-0.6743,-0.25,-0.8168,0,-0.25,-0.733,2.194,-0.25,0.672],
// 3 15 2.194 -0.25 0.672 0 -0.25 -0.733 0.6743 -0.25 -0.8168
  [3,15,2.194,-0.25,0.672,0,-0.25,-0.733,0.6743,-0.25,-0.8168],
// 3 15 2.194 -0.25 0.672 0.6743 -0.25 -0.8168 1.2459 -0.25 -1.0555
  [3,15,2.194,-0.25,0.672,0.6743,-0.25,-0.8168,1.2459,-0.25,-1.0555],
// 3 15 2.194 -0.25 0.672 1.2459 -0.25 -1.0555 1.6279 -0.25 -1.4127
  [3,15,2.194,-0.25,0.672,1.2459,-0.25,-1.0555,1.6279,-0.25,-1.4127],
// 3 15 2.194 -0.25 0.672 1.6279 -0.25 -1.4127 1.762 -0.25 -1.834
  [3,15,2.194,-0.25,0.672,1.6279,-0.25,-1.4127,1.762,-0.25,-1.834],
// 4 15 2.194 -0.25 0.672 1.762 -0.25 -1.834 1.762 -0.25 -3.853 9.45 -0.25 -3.853
  [4,15,2.194,-0.25,0.672,1.762,-0.25,-1.834,1.762,-0.25,-3.853,9.45,-0.25,-3.853],
// 3 15 2.194 -0.25 0.672 9.45 -0.25 -3.853 11.55 -0.25 -3.853
  [3,15,2.194,-0.25,0.672,9.45,-0.25,-3.853,11.55,-0.25,-3.853],
// 3 15 2.194 -0.25 0.672 11.55 -0.25 -3.853 13.65 -0.25 -3.853
  [3,15,2.194,-0.25,0.672,11.55,-0.25,-3.853,13.65,-0.25,-3.853],
// 3 15 2.194 -0.25 0.672 13.65 -0.25 -3.853 15.75 -0.25 -3.853
  [3,15,2.194,-0.25,0.672,13.65,-0.25,-3.853,15.75,-0.25,-3.853],
// 3 15 2.194 -0.25 0.672 15.75 -0.25 -3.853 17.85 -0.25 -3.853
  [3,15,2.194,-0.25,0.672,15.75,-0.25,-3.853,17.85,-0.25,-3.853],
// 3 15 2.194 -0.25 0.672 17.85 -0.25 -3.853 19.95 -0.25 -3.853
  [3,15,2.194,-0.25,0.672,17.85,-0.25,-3.853,19.95,-0.25,-3.853],
// 4 15 2.194 -0.25 0.672 19.95 -0.25 -3.853 27.711 -0.25 -3.853 27.711 -0.25 -1.834
  [4,15,2.194,-0.25,0.672,19.95,-0.25,-3.853,27.711,-0.25,-3.853,27.711,-0.25,-1.834],
// 3 15 2.194 -0.25 0.672 27.711 -0.25 -1.834 27.8451 -0.25 -1.4127
  [3,15,2.194,-0.25,0.672,27.711,-0.25,-1.834,27.8451,-0.25,-1.4127],
// 4 15 2.194 -0.25 0.672 27.8451 -0.25 -1.4127 28.2271 -0.25 -1.0555 26.4237 -0.25 1.641
  [4,15,2.194,-0.25,0.672,27.8451,-0.25,-1.4127,28.2271,-0.25,-1.0555,26.4237,-0.25,1.641],
// 4 15 26.4237 -0.25 1.641 28.2271 -0.25 -1.0555 28.7987 -0.25 -0.8168 30.096 -0.25 1.641
  [4,15,26.4237,-0.25,1.641,28.2271,-0.25,-1.0555,28.7987,-0.25,-0.8168,30.096,-0.25,1.641],
// 4 15 30.096 -0.25 0.672 30.096 -0.25 1.641 28.7987 -0.25 -0.8168 29.473 -0.25 -0.733
  [4,15,30.096,-0.25,0.672,30.096,-0.25,1.641,28.7987,-0.25,-0.8168,29.473,-0.25,-0.733],
// 4 15 30.096 -0.25 0.672 29.473 -0.25 -0.733 30.1473 -0.25 -0.8168 31.3937 -0.25 0.672
  [4,15,30.096,-0.25,0.672,29.473,-0.25,-0.733,30.1473,-0.25,-0.8168,31.3937,-0.25,0.672],
// 3 15 31.3937 -0.25 0.672 30.1473 -0.25 -0.8168 30.7189 -0.25 -1.0555
  [3,15,31.3937,-0.25,0.672,30.1473,-0.25,-0.8168,30.7189,-0.25,-1.0555],
// 3 15 31.3937 -0.25 0.672 30.7189 -0.25 -1.0555 31.1009 -0.25 -1.4127
  [3,15,31.3937,-0.25,0.672,30.7189,-0.25,-1.0555,31.1009,-0.25,-1.4127],
// 3 15 -0.336 -0.25 5.984 0.6261 -0.25 5.8582 29.9079 -0.25 5.93
  [3,15,-0.336,-0.25,5.984,0.6261,-0.25,5.8582,29.9079,-0.25,5.93],
// 3 15 29.9079 -0.25 5.93 0.6261 -0.25 5.8582 1.4417 -0.25 5.4998
  [3,15,29.9079,-0.25,5.93,0.6261,-0.25,5.8582,1.4417,-0.25,5.4998],
// 4 15 29.9079 -0.25 5.93 1.4417 -0.25 5.4998 1.9866 -0.25 4.9636 26.4237 -0.25 2.2707
  [4,15,29.9079,-0.25,5.93,1.4417,-0.25,5.4998,1.9866,-0.25,4.9636,26.4237,-0.25,2.2707],
// 4 15 26.4237 -0.25 2.2707 1.9866 -0.25 4.9636 2.178 -0.25 4.331 26.4237 -0.25 1.641
  [4,15,26.4237,-0.25,2.2707,1.9866,-0.25,4.9636,2.178,-0.25,4.331,26.4237,-0.25,1.641],
// 3 15 2.178 -0.25 4.331 1.9866 -0.25 3.6984 26.4237 -0.25 1.641
  [3,15,2.178,-0.25,4.331,1.9866,-0.25,3.6984,26.4237,-0.25,1.641],
// 4 15 26.4237 -0.25 1.641 1.9866 -0.25 3.6984 1.5671 -0.25 3.2746 2.194 -0.25 1.616
  [4,15,26.4237,-0.25,1.641,1.9866,-0.25,3.6984,1.5671,-0.25,3.2746,2.194,-0.25,1.616],
// 3 15 26.4237 -0.25 1.641 2.194 -0.25 1.616 2.194 -0.25 0.672
  [3,15,26.4237,-0.25,1.641,2.194,-0.25,1.616,2.194,-0.25,0.672],
// 3 15 1.5671 -0.25 3.2746 -0.249 -0.25 1.616 2.194 -0.25 1.616
  [3,15,1.5671,-0.25,3.2746,-0.249,-0.25,1.616,2.194,-0.25,1.616],
// 4 15 -17.85 -0.25 -5.512 -17.85 -0.25 -3.853 -19.95 -0.25 -3.853 -19.95 -0.25 -5.512
  [4,15,-17.85,-0.25,-5.512,-17.85,-0.25,-3.853,-19.95,-0.25,-3.853,-19.95,-0.25,-5.512],
// 4 15 -13.65 -0.25 -5.512 -13.65 -0.25 -3.853 -15.75 -0.25 -3.853 -15.75 -0.25 -5.512
  [4,15,-13.65,-0.25,-5.512,-13.65,-0.25,-3.853,-15.75,-0.25,-3.853,-15.75,-0.25,-5.512],
// 4 15 -9.45 -0.25 -5.512 -9.45 -0.25 -3.853 -11.55 -0.25 -3.853 -11.55 -0.25 -5.512
  [4,15,-9.45,-0.25,-5.512,-9.45,-0.25,-3.853,-11.55,-0.25,-3.853,-11.55,-0.25,-5.512],
// 4 15 11.55 -0.25 -5.512 11.55 -0.25 -3.853 9.45 -0.25 -3.853 9.45 -0.25 -5.512
  [4,15,11.55,-0.25,-5.512,11.55,-0.25,-3.853,9.45,-0.25,-3.853,9.45,-0.25,-5.512],
// 4 15 15.75 -0.25 -5.512 15.75 -0.25 -3.853 13.65 -0.25 -3.853 13.65 -0.25 -5.512
  [4,15,15.75,-0.25,-5.512,15.75,-0.25,-3.853,13.65,-0.25,-3.853,13.65,-0.25,-5.512],
// 4 15 17.85 -0.25 -5.512 19.95 -0.25 -5.512 19.95 -0.25 -3.853 17.85 -0.25 -3.853
  [4,15,17.85,-0.25,-5.512,19.95,-0.25,-5.512,19.95,-0.25,-3.853,17.85,-0.25,-3.853],
// 4 15 28.3027 -0.25 2.419 30.096 -0.25 2.419 30.096 -0.25 4.4889 28.3027 -0.25 2.6055
  [4,15,28.3027,-0.25,2.419,30.096,-0.25,2.419,30.096,-0.25,4.4889,28.3027,-0.25,2.6055],
];
module ldraw_lib__4125165j(step=0, col=false, unit=2/5, alt=false, line=0.2, solid=!$preview)
    makepoly(ldraw_lib__4125165j(), step=step, col=col, unit=unit, alt=alt, line=line, solid=solid);
ldraw_lib__4125165j(line=0.2);
